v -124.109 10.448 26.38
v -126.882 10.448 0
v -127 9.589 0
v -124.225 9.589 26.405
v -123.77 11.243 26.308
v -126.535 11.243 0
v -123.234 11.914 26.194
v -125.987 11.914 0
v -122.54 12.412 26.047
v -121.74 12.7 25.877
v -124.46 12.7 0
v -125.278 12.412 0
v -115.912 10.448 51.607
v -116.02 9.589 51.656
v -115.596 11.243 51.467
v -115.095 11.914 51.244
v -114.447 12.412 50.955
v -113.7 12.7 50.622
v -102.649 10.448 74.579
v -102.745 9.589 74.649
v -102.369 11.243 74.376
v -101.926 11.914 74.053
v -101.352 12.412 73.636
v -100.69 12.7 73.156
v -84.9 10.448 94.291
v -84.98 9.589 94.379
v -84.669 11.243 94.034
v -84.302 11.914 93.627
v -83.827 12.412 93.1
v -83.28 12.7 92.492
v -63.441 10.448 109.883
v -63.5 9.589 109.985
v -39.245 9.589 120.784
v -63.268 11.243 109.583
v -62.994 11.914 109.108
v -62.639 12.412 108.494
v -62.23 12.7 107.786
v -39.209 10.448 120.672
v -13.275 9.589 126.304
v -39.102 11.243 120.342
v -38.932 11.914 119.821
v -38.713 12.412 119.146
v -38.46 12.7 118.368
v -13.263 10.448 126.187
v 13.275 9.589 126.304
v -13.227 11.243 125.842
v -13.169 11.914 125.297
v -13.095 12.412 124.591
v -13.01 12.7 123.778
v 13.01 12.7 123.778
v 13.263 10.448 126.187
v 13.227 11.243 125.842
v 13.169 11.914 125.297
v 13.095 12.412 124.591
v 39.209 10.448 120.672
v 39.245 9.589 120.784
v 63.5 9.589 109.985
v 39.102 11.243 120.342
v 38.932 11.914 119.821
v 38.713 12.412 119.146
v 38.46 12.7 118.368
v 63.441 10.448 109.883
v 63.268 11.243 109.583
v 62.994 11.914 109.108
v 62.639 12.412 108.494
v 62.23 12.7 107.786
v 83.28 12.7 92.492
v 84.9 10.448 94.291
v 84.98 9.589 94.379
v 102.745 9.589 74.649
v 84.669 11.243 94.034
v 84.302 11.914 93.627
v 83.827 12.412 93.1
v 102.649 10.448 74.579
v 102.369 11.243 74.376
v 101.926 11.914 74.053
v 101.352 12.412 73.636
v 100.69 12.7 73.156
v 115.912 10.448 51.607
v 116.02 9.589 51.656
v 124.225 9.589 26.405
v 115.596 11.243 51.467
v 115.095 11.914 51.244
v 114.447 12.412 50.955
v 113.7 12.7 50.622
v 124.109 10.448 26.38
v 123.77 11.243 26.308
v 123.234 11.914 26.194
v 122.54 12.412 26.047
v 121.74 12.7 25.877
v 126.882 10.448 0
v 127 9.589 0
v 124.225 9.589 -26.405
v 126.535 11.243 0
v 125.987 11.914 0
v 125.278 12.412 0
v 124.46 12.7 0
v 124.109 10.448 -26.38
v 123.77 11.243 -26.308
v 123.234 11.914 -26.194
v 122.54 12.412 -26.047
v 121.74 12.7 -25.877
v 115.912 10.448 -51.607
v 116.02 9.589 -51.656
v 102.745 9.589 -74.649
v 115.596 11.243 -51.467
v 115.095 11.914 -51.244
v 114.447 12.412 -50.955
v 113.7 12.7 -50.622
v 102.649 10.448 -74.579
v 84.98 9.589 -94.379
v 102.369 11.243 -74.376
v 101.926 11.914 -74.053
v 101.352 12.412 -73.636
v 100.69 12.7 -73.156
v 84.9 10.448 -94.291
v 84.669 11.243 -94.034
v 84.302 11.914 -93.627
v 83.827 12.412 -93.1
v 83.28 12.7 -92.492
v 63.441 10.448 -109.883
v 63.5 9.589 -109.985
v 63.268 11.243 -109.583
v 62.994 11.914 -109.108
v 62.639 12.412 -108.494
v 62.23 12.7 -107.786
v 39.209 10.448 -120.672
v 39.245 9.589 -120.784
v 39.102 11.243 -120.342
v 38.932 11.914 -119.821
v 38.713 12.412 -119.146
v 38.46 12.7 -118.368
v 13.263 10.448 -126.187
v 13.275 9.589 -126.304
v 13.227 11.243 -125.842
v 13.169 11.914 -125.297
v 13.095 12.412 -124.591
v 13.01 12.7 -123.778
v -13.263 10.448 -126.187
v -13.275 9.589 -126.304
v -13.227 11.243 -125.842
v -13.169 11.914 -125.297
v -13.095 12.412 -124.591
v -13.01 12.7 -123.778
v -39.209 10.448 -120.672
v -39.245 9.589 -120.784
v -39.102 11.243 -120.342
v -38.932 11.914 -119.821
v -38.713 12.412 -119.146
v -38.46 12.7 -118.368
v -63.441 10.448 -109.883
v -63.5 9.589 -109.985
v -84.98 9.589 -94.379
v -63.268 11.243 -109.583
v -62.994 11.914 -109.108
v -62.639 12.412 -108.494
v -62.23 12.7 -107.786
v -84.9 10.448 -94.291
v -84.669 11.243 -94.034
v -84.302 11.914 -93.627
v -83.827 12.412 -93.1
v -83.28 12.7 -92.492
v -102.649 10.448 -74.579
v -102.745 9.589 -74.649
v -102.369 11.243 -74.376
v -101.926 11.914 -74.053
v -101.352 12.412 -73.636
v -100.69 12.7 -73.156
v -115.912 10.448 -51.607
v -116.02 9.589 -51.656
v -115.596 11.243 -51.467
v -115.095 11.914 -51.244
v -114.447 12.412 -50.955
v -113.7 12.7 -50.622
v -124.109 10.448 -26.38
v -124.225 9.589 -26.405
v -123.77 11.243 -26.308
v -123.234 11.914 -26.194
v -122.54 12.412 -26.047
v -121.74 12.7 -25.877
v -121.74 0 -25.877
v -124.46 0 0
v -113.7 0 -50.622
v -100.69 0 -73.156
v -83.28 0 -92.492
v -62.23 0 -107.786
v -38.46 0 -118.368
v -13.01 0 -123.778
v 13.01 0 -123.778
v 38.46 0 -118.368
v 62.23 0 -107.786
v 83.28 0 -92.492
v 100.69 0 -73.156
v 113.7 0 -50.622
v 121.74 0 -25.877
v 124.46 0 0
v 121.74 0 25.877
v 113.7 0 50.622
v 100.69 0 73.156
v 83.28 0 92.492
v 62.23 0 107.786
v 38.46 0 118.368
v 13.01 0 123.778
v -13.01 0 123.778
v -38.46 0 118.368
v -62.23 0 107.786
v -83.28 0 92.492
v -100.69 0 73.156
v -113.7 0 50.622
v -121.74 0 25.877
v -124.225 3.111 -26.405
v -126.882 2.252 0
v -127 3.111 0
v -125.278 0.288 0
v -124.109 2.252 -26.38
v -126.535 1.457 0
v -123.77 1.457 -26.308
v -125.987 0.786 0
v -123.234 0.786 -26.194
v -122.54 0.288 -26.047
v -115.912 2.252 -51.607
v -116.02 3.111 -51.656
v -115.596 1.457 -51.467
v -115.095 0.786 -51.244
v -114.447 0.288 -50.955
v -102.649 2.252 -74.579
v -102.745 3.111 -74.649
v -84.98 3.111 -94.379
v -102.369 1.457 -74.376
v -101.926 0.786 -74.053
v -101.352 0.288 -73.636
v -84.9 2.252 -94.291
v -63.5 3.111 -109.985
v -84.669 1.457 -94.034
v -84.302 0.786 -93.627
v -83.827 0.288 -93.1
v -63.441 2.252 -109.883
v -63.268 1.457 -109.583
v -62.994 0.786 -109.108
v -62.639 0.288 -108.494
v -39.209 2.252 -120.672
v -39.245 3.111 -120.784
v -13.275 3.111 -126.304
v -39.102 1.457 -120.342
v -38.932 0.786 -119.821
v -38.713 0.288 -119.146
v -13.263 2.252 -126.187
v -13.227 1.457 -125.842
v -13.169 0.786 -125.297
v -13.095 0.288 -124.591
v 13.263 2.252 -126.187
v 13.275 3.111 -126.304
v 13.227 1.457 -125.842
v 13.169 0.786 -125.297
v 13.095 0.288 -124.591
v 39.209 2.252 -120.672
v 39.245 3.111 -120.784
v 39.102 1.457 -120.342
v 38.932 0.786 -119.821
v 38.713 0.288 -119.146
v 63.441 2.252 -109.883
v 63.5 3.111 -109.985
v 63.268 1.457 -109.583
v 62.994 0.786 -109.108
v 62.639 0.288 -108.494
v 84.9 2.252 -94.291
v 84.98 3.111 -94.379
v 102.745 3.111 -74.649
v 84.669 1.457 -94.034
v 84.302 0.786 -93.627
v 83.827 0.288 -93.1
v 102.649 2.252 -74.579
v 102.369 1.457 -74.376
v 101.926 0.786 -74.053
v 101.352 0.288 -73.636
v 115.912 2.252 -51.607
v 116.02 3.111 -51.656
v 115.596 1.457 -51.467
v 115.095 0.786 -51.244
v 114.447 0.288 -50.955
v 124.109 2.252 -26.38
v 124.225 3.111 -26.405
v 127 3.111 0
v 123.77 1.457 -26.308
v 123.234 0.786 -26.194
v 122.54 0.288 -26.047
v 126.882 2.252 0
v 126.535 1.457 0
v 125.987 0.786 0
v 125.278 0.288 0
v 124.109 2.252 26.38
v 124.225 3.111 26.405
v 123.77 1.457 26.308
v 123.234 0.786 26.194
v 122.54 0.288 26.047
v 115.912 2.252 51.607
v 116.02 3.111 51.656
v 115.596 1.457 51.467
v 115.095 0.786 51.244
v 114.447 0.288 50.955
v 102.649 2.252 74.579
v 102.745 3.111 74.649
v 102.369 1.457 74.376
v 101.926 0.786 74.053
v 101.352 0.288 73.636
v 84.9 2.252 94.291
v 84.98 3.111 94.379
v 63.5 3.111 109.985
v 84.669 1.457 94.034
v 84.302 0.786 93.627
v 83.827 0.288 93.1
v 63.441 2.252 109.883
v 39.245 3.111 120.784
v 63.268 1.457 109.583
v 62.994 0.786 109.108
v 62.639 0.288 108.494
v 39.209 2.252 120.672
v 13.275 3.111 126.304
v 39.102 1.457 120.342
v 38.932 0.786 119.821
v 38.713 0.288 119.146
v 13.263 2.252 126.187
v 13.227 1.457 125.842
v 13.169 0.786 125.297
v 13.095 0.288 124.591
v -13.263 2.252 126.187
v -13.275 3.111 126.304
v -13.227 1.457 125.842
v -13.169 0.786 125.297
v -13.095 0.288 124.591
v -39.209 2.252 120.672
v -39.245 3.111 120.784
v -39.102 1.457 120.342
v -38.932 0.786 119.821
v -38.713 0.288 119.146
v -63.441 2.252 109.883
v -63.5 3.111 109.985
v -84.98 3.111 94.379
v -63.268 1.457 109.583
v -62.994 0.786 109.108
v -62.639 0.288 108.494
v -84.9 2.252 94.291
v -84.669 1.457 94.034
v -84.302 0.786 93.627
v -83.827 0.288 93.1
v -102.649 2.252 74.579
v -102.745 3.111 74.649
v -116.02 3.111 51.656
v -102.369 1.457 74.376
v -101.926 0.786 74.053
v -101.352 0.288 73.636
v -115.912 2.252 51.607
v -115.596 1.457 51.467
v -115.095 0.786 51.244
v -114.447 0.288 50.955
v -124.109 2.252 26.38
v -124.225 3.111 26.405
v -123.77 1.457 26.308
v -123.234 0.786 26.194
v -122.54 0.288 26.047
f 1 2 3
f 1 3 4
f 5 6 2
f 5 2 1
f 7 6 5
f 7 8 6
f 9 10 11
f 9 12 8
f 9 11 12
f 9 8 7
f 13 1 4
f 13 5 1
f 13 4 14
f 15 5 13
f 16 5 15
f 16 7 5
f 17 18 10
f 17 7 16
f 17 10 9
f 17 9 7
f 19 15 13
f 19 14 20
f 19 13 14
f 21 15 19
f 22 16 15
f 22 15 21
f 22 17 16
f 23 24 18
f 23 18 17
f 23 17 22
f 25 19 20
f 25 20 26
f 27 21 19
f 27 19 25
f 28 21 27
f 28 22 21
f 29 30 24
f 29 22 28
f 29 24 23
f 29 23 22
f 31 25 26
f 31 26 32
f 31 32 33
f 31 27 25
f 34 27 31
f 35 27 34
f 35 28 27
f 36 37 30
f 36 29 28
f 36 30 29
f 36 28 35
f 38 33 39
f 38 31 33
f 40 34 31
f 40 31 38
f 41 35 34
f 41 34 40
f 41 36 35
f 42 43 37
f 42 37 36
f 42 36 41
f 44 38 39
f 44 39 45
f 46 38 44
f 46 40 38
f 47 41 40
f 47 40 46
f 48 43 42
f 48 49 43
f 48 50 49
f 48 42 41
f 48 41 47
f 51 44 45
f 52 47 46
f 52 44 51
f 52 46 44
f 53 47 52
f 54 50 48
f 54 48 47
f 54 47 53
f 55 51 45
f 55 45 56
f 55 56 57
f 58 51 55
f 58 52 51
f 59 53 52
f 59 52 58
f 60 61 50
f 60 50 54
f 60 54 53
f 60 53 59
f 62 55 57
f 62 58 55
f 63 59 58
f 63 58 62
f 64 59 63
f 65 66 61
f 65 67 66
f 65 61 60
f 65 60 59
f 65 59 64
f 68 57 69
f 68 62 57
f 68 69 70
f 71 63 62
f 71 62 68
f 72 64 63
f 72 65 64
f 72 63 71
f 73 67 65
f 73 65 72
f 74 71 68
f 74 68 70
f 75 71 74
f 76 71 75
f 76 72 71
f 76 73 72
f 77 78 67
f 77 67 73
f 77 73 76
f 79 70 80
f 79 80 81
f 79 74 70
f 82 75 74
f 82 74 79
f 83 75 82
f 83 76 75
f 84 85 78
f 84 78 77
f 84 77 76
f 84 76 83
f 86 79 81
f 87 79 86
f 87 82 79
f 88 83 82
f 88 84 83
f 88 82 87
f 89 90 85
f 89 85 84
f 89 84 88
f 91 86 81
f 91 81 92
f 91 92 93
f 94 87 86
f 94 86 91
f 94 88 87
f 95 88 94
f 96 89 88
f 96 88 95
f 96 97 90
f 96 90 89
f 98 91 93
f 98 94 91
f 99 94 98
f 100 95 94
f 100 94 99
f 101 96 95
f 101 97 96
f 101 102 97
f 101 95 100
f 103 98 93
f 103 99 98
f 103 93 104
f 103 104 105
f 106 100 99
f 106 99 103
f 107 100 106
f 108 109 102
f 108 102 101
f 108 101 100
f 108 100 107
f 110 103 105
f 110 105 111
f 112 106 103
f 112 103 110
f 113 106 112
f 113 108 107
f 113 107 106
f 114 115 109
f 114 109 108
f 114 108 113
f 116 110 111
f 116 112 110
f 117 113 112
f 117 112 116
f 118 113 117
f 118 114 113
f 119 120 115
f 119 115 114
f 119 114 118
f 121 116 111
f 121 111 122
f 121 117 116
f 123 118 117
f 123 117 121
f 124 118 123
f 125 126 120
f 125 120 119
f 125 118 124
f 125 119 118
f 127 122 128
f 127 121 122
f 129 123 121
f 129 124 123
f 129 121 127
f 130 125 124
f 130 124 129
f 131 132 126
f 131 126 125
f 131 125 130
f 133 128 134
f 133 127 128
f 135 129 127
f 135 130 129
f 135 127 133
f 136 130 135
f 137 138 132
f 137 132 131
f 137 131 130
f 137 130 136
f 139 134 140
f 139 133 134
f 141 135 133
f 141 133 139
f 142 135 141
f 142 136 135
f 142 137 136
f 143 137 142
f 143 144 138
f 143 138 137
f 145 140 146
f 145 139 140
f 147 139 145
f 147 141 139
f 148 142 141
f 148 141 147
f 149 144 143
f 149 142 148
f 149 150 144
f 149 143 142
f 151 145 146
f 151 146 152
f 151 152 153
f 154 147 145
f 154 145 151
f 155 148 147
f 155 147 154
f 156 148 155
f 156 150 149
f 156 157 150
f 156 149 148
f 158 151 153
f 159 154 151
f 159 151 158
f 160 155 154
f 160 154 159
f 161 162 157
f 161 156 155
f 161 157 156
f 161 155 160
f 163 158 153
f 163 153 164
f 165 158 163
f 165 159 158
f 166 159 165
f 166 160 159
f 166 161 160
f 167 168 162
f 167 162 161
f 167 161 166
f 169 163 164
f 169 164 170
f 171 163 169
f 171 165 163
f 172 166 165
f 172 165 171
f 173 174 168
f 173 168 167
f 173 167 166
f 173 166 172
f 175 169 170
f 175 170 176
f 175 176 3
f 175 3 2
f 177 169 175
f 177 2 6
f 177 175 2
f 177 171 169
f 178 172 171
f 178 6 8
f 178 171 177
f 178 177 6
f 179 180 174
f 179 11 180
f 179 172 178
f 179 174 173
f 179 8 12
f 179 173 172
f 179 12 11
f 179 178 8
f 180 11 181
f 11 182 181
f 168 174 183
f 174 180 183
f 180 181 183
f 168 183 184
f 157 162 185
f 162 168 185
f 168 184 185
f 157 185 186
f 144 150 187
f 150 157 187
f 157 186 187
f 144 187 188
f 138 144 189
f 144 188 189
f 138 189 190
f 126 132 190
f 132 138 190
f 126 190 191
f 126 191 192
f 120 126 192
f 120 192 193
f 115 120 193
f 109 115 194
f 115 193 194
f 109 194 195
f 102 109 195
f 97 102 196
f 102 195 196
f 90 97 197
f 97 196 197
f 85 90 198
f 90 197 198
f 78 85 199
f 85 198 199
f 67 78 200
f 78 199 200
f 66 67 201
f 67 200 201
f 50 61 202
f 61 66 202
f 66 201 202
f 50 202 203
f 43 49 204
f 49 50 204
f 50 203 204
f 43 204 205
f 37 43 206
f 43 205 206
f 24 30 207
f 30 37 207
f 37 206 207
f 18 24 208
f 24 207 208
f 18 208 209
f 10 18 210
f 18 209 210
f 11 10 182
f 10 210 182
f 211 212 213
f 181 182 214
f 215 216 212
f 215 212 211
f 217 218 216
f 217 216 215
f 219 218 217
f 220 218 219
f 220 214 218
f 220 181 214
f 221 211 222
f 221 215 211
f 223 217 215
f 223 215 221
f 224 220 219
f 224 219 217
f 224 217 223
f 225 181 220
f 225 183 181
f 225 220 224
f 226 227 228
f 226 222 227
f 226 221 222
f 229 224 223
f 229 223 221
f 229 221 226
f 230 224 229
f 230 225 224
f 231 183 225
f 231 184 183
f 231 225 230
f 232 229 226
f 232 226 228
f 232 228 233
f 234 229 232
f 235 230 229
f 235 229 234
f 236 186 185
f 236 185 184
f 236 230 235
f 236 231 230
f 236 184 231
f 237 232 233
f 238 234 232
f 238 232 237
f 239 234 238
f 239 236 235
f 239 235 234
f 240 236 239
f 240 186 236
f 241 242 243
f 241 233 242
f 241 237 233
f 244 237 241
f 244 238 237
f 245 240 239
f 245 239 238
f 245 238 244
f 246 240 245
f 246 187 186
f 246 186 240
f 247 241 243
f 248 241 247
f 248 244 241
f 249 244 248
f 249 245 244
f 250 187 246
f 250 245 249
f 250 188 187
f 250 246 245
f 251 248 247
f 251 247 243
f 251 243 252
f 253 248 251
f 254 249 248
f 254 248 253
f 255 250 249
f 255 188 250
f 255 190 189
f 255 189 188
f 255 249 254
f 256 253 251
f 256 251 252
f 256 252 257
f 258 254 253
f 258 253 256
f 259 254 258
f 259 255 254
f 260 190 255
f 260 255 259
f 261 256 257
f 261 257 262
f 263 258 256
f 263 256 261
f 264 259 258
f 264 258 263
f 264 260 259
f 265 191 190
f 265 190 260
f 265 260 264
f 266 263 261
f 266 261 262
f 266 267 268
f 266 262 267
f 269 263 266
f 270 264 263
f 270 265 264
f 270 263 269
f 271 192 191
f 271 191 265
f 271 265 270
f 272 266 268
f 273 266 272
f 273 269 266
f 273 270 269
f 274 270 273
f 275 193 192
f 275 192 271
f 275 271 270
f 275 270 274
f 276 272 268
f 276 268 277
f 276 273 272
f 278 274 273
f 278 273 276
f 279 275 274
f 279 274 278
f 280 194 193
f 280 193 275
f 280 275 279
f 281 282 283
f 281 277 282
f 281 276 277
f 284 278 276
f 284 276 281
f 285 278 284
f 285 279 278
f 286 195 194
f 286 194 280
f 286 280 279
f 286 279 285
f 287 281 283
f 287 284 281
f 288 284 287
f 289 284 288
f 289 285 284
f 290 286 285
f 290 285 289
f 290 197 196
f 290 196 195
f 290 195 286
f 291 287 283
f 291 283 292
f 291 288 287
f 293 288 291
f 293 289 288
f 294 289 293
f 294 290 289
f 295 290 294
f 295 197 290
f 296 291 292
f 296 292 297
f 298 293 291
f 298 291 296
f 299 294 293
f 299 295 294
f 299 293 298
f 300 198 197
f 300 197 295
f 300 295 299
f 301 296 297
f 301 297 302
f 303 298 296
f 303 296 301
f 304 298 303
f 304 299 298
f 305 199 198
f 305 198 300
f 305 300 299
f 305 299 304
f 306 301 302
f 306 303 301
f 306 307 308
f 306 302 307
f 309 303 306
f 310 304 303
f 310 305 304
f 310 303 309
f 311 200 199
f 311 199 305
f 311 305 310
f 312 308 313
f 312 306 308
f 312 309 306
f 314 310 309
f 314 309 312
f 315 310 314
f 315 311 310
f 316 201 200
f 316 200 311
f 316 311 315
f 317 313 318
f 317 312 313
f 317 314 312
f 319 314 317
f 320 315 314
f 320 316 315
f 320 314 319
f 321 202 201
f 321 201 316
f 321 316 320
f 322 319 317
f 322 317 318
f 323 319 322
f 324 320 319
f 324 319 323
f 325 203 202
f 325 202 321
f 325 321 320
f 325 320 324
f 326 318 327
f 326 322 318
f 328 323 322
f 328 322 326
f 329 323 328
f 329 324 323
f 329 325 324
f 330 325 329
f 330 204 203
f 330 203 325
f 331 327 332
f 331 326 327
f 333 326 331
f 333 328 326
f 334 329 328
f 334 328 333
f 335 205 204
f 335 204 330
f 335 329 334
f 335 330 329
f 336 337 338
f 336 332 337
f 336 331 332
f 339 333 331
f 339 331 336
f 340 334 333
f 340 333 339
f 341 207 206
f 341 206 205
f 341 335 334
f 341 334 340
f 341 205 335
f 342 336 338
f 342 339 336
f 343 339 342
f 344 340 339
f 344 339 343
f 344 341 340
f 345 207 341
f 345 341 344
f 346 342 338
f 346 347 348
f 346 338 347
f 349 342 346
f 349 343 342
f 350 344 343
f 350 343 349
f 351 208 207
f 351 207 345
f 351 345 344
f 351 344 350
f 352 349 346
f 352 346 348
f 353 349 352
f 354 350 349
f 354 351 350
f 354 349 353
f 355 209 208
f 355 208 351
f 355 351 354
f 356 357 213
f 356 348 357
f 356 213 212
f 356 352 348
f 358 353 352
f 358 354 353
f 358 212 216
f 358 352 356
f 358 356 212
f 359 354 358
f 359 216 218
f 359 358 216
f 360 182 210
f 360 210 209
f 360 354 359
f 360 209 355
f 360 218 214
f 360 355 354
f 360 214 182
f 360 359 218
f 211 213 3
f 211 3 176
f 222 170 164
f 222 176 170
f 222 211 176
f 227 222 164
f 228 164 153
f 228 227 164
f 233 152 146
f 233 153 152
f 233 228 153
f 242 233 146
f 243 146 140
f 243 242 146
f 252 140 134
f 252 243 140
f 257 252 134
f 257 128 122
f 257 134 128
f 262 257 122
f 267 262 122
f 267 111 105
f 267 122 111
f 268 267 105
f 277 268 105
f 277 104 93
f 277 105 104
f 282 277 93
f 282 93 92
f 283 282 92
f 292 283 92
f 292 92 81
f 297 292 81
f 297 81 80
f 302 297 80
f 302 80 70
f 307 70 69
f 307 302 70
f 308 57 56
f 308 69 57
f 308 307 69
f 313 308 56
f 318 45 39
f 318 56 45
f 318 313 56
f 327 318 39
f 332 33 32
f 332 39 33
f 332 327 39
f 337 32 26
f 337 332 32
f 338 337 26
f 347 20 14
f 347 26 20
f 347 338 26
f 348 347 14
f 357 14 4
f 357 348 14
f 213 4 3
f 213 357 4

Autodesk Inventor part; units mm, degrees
ref_plane "YZ Plane" through (0, 0, 0) normal (1, 0, 0) x (0, 1, 0)
ref_plane "XZ Plane" through (0, 0, 0) normal (0, 1, 0) x (-1, 0, 0)
ref_plane "XY Plane" through (0, 0, 0) normal (0, 0, 1) x (1, 0, 0)
sketch "Sketch1" plane through (0, 0, 0) normal (0, 1, 0) x (-1, 0, 0)
  circle A0 centre (0, 0) radius 124.46
  circle A1 centre (0, 0) radius 127
  dimension "d0" = 248.92
  dimension "d1" = 254
extrude "Extrusion1" add sketch "Sketch1" along normal blind 12.7
fillet "Fillet1" radius 3.175 1 edges at (127, 12.7, 0)
fillet "Fillet2" radius 3.175 1 edges at (127, 0, 0)
properties part number "Prop_Ring"
